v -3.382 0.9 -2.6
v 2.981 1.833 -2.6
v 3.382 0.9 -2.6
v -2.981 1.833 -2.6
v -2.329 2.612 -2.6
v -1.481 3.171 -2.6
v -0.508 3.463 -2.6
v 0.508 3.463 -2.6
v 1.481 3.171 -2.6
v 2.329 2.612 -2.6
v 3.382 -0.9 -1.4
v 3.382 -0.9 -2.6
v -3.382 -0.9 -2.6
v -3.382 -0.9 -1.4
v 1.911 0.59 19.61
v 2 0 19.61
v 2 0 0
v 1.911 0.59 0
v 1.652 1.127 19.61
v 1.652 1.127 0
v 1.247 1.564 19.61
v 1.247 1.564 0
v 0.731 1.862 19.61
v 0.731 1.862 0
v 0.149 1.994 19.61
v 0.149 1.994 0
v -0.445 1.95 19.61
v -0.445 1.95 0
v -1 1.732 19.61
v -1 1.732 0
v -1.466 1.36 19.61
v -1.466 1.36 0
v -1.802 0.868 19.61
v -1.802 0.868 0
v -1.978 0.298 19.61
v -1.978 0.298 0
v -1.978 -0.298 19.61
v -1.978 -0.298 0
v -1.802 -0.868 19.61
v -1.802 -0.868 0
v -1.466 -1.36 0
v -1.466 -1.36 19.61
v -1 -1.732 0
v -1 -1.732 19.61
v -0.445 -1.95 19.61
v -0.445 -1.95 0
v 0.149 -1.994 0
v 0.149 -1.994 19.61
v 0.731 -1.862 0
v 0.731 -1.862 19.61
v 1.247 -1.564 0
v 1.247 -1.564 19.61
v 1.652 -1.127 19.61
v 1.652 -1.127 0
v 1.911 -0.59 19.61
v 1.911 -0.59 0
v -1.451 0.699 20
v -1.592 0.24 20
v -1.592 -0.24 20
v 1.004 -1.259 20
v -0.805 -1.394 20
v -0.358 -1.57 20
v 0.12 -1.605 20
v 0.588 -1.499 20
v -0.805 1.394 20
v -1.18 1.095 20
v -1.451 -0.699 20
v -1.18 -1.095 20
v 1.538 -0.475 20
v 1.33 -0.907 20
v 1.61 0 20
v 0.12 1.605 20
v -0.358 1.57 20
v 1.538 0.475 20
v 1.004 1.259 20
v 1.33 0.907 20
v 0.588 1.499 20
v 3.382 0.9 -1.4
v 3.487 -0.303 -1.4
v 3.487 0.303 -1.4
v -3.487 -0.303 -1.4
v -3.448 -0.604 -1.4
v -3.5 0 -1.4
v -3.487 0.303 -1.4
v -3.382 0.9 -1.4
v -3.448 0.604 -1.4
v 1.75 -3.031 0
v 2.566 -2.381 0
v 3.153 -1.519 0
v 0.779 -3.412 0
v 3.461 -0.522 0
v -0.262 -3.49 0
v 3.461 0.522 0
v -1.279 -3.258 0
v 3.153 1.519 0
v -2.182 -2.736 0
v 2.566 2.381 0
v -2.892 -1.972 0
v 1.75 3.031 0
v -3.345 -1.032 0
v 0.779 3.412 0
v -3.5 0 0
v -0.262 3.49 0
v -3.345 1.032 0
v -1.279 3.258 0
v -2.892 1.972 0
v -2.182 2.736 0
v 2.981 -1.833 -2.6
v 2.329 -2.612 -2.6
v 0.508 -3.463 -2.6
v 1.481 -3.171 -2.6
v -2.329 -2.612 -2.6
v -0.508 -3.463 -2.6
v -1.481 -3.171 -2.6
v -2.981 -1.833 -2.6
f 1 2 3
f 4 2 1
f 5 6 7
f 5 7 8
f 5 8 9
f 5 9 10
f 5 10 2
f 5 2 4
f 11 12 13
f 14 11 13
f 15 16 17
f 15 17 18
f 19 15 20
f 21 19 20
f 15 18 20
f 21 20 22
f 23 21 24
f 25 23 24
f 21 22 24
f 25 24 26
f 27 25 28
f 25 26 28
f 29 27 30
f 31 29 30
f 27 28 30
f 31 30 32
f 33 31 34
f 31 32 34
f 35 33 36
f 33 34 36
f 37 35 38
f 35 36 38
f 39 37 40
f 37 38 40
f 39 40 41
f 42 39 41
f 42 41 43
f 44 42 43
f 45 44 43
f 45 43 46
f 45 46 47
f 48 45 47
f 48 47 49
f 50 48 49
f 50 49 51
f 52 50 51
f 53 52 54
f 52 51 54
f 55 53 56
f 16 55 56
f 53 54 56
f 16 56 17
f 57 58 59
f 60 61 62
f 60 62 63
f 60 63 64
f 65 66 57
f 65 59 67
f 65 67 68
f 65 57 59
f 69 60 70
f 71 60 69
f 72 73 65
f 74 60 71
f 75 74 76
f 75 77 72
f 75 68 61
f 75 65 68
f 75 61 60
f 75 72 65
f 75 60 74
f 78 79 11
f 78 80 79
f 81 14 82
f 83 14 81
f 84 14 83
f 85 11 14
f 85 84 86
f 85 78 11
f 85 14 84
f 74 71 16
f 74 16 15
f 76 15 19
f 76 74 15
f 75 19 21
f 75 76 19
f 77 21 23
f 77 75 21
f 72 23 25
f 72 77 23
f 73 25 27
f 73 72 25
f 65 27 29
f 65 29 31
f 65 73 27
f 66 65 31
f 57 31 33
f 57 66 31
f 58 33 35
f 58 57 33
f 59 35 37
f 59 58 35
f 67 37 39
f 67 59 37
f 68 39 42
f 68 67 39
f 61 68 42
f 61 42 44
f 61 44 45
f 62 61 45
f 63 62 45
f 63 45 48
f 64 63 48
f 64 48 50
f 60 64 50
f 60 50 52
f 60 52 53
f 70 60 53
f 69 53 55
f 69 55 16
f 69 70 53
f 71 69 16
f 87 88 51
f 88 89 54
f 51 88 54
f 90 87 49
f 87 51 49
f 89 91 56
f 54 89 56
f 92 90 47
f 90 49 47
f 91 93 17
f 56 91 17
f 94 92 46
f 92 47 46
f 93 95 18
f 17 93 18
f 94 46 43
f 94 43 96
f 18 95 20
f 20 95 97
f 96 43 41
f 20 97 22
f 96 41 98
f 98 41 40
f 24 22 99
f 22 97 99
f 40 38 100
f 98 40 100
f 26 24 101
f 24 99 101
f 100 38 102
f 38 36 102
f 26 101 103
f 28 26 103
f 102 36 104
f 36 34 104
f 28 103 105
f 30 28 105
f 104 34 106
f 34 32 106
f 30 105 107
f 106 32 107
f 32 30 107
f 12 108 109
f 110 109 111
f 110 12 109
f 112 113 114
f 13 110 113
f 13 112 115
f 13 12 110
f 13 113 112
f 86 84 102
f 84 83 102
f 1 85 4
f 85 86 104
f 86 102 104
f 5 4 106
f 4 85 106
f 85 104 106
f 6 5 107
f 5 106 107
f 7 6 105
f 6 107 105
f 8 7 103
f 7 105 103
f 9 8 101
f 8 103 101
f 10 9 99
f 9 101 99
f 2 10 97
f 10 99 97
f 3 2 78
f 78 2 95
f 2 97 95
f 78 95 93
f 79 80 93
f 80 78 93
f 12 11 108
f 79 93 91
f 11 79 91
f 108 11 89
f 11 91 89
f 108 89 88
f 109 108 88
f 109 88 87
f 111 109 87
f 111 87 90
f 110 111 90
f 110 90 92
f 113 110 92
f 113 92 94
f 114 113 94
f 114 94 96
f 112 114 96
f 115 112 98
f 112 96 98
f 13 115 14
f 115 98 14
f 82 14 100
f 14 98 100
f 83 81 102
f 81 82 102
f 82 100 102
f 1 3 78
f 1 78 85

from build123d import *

# Parameters (mm, degrees)
SKETCH_1_R          = 2
EXTRUDE_1_DEPTH     = 20
SKETCH_2_R          = 3.5
EXTRUDE_2_DEPTH     = 2.6
SKETCH_3_W          = 9
SKETCH_3_H          = 1.8
CUT_EXTRUDE_1_DEPTH = 1.2
CHAMFER_1_SIZE      = 0.39


with BuildPart() as part:
    # Эскиз1 → Бобышка-Вытянуть1 (new body)
    with BuildSketch(Plane.XY):
        Circle(SKETCH_1_R)
    extrude(amount=EXTRUDE_1_DEPTH)

    # Эскиз2 → Бобышка-Вытянуть2 (add)
    with BuildSketch(Plane(origin=(0, 0, 0), x_dir=(-1, 0, 0), z_dir=(0, 0, -1))):
        Circle(SKETCH_2_R)
    extrude(amount=EXTRUDE_2_DEPTH)

    # Эскиз3 → Вырез-Вытянуть1 (cut)
    with BuildSketch(Plane(origin=(0, 0, -2.6), x_dir=(-1, 0, 0), z_dir=(0, 0, -1))):
        Rectangle(SKETCH_3_W, SKETCH_3_H)
    extrude(amount=-CUT_EXTRUDE_1_DEPTH, mode=Mode.SUBTRACT)

    # Фаска1
    chamfer_1_edges = [part.edges().sort_by_distance(p)[0] for p in [
        (-2, 0, 20),
    ]]
    chamfer(chamfer_1_edges, length=CHAMFER_1_SIZE)


solid = part.part
